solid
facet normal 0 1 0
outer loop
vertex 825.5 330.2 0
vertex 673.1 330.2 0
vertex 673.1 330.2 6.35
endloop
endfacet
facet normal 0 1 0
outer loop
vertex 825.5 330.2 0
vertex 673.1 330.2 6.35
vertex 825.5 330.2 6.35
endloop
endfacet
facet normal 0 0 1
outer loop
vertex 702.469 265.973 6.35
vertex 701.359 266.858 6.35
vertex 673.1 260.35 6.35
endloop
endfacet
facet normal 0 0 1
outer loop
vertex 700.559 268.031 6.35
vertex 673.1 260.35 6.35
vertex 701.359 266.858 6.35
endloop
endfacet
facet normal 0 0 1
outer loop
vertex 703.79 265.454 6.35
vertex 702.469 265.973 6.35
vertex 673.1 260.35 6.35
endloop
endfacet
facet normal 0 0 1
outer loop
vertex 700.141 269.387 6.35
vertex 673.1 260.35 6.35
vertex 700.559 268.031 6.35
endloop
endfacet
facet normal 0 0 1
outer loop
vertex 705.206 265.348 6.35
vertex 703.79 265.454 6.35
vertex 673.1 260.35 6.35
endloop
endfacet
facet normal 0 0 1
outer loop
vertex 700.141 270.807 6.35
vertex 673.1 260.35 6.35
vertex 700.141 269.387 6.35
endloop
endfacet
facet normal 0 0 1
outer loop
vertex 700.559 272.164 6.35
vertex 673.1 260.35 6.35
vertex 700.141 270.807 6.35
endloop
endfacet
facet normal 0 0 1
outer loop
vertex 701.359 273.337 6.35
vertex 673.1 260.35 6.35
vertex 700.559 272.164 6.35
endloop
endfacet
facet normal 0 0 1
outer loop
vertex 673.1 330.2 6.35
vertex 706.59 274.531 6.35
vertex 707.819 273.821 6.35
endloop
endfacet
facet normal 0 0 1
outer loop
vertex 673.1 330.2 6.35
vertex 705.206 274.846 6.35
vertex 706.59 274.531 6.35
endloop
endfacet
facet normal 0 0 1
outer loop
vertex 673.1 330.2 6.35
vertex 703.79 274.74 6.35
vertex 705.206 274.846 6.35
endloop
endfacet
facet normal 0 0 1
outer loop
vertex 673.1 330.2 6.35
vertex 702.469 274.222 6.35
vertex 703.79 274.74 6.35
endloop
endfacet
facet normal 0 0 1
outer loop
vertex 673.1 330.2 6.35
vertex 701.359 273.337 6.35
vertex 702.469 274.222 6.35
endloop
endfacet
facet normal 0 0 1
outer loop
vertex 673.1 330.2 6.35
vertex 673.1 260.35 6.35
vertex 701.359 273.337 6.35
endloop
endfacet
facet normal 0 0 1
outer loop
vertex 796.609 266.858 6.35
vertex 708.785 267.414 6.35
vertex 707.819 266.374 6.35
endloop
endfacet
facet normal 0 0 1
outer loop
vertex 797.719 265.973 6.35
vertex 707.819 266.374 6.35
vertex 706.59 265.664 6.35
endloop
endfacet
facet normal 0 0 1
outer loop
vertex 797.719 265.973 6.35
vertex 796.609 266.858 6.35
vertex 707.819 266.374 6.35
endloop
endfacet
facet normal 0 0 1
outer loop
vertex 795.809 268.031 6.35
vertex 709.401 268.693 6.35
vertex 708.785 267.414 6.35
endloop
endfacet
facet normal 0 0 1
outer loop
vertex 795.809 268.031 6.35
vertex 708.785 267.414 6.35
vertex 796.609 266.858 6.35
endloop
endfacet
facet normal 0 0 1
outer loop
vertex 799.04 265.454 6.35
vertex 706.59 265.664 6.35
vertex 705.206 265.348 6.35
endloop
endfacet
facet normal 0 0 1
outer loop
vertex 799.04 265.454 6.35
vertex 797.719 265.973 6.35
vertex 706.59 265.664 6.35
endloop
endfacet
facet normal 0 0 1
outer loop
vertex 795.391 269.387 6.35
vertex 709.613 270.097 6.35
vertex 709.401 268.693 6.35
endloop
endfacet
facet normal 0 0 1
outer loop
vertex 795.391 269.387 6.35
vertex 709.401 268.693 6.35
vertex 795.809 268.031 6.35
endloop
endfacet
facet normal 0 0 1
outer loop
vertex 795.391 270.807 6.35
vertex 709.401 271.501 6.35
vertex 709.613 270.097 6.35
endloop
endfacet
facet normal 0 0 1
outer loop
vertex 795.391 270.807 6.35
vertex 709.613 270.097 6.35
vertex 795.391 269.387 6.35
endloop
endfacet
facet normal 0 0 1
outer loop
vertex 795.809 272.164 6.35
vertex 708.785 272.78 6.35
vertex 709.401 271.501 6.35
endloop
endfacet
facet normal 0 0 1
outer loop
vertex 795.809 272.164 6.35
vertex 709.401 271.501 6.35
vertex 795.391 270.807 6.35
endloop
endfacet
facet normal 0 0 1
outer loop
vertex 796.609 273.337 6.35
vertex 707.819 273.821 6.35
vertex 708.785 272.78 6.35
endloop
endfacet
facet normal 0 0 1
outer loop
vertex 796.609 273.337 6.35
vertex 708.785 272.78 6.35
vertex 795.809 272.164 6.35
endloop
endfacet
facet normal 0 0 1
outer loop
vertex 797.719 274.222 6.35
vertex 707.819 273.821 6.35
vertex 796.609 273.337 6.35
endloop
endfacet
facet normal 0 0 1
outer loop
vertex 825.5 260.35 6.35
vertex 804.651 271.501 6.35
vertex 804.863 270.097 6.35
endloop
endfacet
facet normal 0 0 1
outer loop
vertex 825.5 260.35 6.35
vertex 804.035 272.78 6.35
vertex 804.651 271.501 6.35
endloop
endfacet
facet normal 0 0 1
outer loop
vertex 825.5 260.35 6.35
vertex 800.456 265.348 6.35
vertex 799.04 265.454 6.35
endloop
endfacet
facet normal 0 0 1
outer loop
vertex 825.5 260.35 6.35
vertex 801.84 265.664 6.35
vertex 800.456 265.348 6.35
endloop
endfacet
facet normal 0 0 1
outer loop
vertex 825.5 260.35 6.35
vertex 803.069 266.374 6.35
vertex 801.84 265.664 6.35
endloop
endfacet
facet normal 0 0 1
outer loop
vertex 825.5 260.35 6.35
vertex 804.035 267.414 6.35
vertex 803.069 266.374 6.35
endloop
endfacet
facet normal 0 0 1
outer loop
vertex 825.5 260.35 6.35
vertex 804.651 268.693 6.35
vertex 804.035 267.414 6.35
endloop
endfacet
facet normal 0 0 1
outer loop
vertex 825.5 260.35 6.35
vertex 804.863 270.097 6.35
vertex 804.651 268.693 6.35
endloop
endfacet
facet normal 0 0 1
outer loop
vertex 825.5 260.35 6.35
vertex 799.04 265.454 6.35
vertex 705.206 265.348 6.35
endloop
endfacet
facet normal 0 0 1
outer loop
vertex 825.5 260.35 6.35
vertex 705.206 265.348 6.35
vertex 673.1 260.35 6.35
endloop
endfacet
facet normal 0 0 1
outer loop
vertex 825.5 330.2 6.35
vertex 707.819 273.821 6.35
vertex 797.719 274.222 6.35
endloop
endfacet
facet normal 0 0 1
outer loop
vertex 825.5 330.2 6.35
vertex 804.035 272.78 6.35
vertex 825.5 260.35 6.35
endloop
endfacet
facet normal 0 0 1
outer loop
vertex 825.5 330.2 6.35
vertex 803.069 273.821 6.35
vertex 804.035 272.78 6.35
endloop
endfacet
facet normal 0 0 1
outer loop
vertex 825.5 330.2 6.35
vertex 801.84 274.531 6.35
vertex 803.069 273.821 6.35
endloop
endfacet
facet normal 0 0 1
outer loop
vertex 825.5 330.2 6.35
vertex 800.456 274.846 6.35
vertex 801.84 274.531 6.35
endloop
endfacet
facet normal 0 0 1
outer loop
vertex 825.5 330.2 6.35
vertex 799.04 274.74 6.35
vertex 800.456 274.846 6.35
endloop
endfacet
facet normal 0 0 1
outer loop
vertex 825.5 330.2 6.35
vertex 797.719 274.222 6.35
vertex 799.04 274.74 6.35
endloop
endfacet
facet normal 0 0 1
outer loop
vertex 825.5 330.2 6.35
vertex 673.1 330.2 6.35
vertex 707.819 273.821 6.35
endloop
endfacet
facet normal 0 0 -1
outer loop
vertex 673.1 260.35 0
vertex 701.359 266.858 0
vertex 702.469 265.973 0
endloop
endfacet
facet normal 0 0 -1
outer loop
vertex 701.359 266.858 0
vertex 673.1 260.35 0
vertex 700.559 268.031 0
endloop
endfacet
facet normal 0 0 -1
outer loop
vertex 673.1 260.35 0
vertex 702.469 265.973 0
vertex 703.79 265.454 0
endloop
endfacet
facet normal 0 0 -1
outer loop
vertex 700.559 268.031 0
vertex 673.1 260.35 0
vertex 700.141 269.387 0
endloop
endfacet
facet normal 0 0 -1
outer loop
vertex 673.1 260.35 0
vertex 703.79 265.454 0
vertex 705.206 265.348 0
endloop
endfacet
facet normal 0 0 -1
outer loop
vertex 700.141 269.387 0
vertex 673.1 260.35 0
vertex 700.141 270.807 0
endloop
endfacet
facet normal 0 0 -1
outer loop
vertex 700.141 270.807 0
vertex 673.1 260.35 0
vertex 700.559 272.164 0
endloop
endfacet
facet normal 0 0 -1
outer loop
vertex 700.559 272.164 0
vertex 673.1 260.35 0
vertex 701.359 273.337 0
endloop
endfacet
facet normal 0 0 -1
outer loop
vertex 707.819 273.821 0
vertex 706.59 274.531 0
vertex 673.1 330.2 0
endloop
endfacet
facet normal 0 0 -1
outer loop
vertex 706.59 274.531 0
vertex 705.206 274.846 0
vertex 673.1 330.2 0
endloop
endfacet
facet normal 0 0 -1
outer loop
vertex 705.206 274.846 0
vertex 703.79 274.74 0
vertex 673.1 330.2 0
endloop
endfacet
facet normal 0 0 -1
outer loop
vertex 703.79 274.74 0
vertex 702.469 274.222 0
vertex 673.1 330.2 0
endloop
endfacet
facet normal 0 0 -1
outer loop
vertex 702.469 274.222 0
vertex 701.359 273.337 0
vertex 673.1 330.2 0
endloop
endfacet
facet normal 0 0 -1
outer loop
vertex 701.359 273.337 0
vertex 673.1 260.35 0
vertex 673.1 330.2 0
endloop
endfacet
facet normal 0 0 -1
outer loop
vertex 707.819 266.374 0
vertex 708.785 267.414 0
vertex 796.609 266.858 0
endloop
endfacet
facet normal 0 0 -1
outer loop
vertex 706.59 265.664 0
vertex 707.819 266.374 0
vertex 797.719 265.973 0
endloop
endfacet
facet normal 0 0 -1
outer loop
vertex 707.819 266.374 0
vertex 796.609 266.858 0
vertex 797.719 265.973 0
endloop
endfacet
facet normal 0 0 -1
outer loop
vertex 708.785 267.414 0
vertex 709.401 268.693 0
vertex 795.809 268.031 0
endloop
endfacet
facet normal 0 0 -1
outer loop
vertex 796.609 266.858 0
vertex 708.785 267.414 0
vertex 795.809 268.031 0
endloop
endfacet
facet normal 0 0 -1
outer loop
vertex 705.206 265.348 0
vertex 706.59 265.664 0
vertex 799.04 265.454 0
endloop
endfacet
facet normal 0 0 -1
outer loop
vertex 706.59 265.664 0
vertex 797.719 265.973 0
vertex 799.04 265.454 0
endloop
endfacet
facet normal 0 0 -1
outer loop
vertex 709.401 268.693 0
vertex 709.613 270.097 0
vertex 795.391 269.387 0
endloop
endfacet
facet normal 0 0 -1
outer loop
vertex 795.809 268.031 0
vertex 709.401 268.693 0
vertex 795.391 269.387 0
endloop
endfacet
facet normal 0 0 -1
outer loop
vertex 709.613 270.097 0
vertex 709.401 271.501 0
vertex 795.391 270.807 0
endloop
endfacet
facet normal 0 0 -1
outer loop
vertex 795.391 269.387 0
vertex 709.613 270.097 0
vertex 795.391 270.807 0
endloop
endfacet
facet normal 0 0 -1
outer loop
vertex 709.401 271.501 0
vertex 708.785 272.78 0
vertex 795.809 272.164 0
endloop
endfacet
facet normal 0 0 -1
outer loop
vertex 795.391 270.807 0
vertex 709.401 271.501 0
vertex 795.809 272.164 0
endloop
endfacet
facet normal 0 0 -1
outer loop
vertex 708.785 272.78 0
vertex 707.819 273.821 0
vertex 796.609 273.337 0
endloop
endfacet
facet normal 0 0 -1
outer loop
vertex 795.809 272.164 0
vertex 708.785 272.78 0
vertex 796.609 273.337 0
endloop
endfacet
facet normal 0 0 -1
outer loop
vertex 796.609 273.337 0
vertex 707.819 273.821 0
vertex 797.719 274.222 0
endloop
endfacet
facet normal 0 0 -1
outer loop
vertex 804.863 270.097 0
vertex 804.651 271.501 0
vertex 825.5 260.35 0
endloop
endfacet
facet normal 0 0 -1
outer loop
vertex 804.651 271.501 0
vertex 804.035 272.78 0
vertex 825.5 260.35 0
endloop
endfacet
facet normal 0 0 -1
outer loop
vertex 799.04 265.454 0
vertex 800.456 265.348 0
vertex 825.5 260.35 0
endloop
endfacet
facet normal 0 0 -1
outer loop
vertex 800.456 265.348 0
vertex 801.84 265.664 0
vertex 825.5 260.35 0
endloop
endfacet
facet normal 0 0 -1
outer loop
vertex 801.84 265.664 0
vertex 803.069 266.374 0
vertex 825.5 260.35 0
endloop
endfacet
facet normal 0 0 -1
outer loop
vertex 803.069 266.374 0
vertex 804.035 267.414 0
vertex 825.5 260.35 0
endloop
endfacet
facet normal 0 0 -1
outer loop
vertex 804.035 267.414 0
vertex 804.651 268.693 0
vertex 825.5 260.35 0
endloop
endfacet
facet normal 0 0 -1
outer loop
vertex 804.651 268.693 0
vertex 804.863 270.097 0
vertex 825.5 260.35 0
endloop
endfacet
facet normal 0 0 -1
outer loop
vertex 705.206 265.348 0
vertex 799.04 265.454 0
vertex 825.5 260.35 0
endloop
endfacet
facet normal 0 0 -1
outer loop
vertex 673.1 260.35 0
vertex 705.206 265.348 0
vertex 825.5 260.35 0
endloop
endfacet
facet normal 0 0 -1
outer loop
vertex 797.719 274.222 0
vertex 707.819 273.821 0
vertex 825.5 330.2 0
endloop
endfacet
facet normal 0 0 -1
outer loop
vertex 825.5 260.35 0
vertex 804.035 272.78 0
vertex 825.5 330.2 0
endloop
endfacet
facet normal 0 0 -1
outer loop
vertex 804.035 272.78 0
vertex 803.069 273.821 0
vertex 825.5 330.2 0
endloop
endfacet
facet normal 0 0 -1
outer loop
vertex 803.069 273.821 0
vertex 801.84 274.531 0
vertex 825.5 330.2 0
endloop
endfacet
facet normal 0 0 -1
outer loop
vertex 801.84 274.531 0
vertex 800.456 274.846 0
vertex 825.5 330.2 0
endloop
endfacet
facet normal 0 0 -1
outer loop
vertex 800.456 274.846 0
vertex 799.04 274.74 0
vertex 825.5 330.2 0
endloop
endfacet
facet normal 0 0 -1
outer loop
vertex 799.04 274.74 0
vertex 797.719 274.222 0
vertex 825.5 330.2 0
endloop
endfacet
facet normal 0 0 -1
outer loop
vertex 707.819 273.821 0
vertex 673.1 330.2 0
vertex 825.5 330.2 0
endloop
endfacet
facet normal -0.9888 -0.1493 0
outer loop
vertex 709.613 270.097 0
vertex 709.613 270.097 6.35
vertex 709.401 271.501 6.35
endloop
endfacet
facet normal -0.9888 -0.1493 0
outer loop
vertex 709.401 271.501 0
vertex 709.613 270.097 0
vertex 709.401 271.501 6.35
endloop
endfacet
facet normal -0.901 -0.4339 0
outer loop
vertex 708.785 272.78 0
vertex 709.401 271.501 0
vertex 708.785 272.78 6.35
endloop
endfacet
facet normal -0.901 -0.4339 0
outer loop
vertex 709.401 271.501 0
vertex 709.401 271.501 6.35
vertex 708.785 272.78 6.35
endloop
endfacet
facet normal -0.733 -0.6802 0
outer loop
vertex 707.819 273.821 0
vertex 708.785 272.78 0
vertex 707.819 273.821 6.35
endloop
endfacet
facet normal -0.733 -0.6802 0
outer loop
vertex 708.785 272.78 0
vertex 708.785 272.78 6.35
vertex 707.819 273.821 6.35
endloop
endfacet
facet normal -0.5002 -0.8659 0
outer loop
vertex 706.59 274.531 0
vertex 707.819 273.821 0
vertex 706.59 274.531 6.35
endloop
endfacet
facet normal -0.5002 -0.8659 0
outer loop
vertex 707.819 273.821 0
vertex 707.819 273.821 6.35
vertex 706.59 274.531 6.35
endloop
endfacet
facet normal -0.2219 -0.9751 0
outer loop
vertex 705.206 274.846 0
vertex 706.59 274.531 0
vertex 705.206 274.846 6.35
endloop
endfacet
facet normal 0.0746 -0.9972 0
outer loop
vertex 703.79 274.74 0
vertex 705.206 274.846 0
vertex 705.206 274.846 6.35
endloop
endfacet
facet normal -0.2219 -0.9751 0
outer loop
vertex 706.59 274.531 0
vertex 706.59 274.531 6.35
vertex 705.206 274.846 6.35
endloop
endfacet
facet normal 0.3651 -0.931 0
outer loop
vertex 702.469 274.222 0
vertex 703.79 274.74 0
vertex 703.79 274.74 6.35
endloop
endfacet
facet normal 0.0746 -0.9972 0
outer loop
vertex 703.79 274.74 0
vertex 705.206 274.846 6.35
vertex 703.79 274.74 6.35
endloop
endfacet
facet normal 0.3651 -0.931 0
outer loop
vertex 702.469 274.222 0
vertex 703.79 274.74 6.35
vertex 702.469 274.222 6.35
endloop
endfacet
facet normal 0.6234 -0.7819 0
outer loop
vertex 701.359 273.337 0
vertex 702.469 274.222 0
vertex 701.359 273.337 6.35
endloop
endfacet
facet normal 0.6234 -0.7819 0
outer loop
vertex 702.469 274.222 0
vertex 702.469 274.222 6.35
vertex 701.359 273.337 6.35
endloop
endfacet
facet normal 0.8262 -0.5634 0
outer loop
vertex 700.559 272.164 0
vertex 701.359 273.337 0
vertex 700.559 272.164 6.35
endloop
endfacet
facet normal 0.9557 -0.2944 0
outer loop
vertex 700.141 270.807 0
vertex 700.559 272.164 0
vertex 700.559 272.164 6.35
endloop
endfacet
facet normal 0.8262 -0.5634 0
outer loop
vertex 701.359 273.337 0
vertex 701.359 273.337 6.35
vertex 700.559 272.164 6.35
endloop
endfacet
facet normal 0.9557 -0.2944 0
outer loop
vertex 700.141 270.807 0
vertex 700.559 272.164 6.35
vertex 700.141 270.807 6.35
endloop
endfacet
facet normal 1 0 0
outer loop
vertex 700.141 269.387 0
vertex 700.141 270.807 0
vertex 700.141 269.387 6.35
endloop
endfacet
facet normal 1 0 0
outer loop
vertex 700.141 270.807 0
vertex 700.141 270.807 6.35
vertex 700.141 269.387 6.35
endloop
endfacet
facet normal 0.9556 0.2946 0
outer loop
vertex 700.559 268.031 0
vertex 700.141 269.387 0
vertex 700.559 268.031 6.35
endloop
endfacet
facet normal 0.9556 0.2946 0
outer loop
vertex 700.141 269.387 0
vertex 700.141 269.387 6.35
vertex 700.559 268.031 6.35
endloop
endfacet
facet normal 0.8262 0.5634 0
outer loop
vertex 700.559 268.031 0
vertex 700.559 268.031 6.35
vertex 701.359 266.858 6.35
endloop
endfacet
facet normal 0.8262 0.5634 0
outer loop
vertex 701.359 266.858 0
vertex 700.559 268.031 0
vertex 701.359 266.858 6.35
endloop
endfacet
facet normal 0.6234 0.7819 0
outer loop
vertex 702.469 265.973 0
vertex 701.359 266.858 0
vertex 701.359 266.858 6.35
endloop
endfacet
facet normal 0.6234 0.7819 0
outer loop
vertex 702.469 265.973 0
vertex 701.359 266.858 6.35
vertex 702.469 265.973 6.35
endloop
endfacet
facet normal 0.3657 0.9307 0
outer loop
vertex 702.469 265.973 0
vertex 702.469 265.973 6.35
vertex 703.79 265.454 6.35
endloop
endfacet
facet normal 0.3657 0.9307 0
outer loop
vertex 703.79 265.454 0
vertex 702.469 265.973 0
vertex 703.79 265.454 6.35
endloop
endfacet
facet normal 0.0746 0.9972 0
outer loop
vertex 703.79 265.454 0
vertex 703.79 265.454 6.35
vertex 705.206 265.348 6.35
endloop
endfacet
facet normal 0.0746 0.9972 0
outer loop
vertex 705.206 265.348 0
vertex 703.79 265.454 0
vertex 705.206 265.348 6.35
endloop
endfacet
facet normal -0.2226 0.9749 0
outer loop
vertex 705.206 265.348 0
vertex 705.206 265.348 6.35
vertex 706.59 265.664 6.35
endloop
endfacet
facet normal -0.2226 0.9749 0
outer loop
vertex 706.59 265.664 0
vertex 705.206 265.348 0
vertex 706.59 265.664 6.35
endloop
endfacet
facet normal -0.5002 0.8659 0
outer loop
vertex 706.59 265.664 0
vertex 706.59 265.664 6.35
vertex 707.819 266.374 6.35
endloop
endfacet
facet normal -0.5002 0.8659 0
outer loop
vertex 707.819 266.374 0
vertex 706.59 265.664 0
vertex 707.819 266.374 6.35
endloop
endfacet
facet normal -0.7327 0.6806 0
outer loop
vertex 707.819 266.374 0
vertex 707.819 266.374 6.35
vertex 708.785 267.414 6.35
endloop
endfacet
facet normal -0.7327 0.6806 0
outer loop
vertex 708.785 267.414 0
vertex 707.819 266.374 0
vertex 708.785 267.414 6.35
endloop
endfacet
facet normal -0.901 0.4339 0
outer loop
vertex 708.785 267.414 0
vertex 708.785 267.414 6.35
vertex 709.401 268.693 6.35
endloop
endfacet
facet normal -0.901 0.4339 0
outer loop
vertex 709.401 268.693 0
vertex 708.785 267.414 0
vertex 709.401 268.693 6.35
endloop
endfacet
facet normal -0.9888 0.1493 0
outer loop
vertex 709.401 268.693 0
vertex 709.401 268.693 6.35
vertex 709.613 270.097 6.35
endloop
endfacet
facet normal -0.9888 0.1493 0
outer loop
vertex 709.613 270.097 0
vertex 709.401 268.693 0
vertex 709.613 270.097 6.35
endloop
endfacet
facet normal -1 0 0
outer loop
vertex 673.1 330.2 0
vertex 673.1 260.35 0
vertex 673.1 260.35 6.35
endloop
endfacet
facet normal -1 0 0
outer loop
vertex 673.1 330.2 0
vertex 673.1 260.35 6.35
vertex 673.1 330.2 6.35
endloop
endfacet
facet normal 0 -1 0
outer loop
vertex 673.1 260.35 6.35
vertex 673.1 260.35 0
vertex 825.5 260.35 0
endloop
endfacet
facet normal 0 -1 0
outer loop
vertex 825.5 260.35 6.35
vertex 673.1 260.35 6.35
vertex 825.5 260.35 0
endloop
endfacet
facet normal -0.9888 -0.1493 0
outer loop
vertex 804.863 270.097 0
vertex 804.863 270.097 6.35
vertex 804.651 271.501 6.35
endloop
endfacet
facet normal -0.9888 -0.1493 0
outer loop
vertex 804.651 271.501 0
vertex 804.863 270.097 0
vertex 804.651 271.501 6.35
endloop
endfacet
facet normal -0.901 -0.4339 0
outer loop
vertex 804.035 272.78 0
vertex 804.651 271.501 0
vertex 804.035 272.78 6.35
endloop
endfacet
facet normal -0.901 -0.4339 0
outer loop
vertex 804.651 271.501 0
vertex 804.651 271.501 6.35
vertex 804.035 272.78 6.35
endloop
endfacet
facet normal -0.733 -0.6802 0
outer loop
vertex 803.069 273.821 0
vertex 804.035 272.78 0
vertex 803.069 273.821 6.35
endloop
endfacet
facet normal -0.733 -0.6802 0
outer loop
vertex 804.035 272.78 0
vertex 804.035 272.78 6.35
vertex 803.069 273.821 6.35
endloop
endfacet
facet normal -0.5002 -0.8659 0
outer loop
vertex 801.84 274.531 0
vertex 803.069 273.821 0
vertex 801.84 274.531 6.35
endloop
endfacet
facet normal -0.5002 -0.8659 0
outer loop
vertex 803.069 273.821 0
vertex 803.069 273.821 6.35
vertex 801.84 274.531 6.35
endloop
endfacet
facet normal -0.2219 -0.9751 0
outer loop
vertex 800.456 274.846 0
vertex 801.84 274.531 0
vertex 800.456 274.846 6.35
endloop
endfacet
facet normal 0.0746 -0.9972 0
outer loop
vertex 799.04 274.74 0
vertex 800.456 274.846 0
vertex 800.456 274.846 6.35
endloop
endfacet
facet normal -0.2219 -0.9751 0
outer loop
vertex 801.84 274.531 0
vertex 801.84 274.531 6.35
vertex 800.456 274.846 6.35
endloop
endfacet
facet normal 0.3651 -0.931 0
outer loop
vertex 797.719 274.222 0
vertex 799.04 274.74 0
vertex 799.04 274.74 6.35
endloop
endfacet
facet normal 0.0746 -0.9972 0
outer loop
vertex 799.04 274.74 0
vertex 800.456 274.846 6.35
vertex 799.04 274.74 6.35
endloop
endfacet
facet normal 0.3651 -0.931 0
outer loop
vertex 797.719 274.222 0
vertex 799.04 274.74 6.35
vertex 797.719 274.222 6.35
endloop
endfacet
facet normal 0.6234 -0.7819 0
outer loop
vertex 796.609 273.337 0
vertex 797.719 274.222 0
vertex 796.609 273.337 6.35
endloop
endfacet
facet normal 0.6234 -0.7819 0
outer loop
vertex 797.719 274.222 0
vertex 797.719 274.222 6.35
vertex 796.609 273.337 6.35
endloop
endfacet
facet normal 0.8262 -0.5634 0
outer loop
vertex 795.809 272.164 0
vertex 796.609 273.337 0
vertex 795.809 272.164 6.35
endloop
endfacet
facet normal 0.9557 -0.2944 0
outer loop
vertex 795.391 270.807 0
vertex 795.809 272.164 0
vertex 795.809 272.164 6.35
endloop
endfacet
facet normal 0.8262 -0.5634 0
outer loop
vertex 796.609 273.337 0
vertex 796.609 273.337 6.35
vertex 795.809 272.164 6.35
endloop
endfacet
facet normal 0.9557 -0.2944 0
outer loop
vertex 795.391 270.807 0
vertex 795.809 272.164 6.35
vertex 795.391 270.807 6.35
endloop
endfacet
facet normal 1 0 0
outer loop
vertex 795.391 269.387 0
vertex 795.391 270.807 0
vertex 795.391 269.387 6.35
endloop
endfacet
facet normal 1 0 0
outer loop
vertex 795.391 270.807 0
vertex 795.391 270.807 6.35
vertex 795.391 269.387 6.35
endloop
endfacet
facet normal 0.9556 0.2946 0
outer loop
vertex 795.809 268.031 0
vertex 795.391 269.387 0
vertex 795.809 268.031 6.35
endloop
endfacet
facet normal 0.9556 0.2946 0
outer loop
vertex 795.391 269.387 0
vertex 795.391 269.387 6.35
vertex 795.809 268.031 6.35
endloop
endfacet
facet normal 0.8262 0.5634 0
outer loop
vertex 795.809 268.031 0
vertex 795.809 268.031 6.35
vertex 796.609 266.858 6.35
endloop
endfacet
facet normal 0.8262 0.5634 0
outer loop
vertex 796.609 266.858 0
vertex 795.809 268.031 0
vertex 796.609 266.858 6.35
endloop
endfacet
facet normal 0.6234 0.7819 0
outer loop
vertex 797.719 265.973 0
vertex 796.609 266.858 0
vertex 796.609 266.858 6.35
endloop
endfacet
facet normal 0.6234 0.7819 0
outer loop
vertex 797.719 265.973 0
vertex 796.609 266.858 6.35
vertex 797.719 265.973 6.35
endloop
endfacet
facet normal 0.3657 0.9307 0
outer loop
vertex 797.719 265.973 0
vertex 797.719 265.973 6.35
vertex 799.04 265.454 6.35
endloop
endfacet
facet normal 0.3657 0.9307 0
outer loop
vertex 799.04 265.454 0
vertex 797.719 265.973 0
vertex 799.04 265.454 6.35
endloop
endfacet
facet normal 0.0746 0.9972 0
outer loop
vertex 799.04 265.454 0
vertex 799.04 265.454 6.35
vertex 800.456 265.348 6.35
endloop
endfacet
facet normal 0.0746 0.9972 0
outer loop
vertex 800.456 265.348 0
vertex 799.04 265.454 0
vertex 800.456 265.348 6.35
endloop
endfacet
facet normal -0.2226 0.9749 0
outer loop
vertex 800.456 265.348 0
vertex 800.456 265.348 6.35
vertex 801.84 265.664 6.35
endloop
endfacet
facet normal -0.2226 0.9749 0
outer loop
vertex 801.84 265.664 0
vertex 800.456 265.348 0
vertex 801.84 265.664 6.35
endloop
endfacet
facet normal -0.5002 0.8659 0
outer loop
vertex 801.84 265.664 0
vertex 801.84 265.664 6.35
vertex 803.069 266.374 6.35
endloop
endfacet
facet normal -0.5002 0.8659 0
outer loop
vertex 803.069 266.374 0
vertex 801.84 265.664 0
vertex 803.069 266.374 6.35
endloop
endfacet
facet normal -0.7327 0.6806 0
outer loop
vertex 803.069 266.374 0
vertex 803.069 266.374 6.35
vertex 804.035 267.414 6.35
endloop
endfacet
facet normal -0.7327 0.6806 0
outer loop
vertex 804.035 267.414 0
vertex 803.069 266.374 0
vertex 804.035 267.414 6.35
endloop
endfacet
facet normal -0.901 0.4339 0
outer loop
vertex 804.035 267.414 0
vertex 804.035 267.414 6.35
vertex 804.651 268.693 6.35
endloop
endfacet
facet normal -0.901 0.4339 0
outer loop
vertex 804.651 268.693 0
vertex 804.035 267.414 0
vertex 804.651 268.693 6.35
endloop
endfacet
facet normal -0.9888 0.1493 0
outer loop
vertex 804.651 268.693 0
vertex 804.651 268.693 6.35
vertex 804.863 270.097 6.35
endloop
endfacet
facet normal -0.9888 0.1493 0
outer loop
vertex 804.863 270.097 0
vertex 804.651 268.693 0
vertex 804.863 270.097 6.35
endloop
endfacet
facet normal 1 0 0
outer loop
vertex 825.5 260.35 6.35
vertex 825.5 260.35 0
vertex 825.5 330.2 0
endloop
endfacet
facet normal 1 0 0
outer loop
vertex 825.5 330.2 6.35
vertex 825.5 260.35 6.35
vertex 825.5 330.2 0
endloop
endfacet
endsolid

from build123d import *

# Parameters (mm, degrees)
SKETCH1_W          = 152.4
SKETCH1_H          = 69.85
EXTRUDE1_DEPTH     = 6.35
SKETCH2_R          = 4.7625
CUT_EXTRUDE1_DEPTH = 7.35


with BuildPart() as part:
    # Sketch1 → Extrude1 (new body)
    with BuildSketch(Plane.XY):
        with Locations((749.3, 295.275)):
            Rectangle(SKETCH1_W, SKETCH1_H)
    extrude(amount=EXTRUDE1_DEPTH)

    # Sketch2 → Cut-Extrude1 (cut, through all)
    with BuildSketch(Plane.XY.offset(6.35)):
        with Locations((800.1, 270.09725)):
            Circle(SKETCH2_R)
        with Locations((704.85, 270.09725)):
            Circle(SKETCH2_R)
    extrude(amount=-CUT_EXTRUDE1_DEPTH, mode=Mode.SUBTRACT)


solid = part.part
